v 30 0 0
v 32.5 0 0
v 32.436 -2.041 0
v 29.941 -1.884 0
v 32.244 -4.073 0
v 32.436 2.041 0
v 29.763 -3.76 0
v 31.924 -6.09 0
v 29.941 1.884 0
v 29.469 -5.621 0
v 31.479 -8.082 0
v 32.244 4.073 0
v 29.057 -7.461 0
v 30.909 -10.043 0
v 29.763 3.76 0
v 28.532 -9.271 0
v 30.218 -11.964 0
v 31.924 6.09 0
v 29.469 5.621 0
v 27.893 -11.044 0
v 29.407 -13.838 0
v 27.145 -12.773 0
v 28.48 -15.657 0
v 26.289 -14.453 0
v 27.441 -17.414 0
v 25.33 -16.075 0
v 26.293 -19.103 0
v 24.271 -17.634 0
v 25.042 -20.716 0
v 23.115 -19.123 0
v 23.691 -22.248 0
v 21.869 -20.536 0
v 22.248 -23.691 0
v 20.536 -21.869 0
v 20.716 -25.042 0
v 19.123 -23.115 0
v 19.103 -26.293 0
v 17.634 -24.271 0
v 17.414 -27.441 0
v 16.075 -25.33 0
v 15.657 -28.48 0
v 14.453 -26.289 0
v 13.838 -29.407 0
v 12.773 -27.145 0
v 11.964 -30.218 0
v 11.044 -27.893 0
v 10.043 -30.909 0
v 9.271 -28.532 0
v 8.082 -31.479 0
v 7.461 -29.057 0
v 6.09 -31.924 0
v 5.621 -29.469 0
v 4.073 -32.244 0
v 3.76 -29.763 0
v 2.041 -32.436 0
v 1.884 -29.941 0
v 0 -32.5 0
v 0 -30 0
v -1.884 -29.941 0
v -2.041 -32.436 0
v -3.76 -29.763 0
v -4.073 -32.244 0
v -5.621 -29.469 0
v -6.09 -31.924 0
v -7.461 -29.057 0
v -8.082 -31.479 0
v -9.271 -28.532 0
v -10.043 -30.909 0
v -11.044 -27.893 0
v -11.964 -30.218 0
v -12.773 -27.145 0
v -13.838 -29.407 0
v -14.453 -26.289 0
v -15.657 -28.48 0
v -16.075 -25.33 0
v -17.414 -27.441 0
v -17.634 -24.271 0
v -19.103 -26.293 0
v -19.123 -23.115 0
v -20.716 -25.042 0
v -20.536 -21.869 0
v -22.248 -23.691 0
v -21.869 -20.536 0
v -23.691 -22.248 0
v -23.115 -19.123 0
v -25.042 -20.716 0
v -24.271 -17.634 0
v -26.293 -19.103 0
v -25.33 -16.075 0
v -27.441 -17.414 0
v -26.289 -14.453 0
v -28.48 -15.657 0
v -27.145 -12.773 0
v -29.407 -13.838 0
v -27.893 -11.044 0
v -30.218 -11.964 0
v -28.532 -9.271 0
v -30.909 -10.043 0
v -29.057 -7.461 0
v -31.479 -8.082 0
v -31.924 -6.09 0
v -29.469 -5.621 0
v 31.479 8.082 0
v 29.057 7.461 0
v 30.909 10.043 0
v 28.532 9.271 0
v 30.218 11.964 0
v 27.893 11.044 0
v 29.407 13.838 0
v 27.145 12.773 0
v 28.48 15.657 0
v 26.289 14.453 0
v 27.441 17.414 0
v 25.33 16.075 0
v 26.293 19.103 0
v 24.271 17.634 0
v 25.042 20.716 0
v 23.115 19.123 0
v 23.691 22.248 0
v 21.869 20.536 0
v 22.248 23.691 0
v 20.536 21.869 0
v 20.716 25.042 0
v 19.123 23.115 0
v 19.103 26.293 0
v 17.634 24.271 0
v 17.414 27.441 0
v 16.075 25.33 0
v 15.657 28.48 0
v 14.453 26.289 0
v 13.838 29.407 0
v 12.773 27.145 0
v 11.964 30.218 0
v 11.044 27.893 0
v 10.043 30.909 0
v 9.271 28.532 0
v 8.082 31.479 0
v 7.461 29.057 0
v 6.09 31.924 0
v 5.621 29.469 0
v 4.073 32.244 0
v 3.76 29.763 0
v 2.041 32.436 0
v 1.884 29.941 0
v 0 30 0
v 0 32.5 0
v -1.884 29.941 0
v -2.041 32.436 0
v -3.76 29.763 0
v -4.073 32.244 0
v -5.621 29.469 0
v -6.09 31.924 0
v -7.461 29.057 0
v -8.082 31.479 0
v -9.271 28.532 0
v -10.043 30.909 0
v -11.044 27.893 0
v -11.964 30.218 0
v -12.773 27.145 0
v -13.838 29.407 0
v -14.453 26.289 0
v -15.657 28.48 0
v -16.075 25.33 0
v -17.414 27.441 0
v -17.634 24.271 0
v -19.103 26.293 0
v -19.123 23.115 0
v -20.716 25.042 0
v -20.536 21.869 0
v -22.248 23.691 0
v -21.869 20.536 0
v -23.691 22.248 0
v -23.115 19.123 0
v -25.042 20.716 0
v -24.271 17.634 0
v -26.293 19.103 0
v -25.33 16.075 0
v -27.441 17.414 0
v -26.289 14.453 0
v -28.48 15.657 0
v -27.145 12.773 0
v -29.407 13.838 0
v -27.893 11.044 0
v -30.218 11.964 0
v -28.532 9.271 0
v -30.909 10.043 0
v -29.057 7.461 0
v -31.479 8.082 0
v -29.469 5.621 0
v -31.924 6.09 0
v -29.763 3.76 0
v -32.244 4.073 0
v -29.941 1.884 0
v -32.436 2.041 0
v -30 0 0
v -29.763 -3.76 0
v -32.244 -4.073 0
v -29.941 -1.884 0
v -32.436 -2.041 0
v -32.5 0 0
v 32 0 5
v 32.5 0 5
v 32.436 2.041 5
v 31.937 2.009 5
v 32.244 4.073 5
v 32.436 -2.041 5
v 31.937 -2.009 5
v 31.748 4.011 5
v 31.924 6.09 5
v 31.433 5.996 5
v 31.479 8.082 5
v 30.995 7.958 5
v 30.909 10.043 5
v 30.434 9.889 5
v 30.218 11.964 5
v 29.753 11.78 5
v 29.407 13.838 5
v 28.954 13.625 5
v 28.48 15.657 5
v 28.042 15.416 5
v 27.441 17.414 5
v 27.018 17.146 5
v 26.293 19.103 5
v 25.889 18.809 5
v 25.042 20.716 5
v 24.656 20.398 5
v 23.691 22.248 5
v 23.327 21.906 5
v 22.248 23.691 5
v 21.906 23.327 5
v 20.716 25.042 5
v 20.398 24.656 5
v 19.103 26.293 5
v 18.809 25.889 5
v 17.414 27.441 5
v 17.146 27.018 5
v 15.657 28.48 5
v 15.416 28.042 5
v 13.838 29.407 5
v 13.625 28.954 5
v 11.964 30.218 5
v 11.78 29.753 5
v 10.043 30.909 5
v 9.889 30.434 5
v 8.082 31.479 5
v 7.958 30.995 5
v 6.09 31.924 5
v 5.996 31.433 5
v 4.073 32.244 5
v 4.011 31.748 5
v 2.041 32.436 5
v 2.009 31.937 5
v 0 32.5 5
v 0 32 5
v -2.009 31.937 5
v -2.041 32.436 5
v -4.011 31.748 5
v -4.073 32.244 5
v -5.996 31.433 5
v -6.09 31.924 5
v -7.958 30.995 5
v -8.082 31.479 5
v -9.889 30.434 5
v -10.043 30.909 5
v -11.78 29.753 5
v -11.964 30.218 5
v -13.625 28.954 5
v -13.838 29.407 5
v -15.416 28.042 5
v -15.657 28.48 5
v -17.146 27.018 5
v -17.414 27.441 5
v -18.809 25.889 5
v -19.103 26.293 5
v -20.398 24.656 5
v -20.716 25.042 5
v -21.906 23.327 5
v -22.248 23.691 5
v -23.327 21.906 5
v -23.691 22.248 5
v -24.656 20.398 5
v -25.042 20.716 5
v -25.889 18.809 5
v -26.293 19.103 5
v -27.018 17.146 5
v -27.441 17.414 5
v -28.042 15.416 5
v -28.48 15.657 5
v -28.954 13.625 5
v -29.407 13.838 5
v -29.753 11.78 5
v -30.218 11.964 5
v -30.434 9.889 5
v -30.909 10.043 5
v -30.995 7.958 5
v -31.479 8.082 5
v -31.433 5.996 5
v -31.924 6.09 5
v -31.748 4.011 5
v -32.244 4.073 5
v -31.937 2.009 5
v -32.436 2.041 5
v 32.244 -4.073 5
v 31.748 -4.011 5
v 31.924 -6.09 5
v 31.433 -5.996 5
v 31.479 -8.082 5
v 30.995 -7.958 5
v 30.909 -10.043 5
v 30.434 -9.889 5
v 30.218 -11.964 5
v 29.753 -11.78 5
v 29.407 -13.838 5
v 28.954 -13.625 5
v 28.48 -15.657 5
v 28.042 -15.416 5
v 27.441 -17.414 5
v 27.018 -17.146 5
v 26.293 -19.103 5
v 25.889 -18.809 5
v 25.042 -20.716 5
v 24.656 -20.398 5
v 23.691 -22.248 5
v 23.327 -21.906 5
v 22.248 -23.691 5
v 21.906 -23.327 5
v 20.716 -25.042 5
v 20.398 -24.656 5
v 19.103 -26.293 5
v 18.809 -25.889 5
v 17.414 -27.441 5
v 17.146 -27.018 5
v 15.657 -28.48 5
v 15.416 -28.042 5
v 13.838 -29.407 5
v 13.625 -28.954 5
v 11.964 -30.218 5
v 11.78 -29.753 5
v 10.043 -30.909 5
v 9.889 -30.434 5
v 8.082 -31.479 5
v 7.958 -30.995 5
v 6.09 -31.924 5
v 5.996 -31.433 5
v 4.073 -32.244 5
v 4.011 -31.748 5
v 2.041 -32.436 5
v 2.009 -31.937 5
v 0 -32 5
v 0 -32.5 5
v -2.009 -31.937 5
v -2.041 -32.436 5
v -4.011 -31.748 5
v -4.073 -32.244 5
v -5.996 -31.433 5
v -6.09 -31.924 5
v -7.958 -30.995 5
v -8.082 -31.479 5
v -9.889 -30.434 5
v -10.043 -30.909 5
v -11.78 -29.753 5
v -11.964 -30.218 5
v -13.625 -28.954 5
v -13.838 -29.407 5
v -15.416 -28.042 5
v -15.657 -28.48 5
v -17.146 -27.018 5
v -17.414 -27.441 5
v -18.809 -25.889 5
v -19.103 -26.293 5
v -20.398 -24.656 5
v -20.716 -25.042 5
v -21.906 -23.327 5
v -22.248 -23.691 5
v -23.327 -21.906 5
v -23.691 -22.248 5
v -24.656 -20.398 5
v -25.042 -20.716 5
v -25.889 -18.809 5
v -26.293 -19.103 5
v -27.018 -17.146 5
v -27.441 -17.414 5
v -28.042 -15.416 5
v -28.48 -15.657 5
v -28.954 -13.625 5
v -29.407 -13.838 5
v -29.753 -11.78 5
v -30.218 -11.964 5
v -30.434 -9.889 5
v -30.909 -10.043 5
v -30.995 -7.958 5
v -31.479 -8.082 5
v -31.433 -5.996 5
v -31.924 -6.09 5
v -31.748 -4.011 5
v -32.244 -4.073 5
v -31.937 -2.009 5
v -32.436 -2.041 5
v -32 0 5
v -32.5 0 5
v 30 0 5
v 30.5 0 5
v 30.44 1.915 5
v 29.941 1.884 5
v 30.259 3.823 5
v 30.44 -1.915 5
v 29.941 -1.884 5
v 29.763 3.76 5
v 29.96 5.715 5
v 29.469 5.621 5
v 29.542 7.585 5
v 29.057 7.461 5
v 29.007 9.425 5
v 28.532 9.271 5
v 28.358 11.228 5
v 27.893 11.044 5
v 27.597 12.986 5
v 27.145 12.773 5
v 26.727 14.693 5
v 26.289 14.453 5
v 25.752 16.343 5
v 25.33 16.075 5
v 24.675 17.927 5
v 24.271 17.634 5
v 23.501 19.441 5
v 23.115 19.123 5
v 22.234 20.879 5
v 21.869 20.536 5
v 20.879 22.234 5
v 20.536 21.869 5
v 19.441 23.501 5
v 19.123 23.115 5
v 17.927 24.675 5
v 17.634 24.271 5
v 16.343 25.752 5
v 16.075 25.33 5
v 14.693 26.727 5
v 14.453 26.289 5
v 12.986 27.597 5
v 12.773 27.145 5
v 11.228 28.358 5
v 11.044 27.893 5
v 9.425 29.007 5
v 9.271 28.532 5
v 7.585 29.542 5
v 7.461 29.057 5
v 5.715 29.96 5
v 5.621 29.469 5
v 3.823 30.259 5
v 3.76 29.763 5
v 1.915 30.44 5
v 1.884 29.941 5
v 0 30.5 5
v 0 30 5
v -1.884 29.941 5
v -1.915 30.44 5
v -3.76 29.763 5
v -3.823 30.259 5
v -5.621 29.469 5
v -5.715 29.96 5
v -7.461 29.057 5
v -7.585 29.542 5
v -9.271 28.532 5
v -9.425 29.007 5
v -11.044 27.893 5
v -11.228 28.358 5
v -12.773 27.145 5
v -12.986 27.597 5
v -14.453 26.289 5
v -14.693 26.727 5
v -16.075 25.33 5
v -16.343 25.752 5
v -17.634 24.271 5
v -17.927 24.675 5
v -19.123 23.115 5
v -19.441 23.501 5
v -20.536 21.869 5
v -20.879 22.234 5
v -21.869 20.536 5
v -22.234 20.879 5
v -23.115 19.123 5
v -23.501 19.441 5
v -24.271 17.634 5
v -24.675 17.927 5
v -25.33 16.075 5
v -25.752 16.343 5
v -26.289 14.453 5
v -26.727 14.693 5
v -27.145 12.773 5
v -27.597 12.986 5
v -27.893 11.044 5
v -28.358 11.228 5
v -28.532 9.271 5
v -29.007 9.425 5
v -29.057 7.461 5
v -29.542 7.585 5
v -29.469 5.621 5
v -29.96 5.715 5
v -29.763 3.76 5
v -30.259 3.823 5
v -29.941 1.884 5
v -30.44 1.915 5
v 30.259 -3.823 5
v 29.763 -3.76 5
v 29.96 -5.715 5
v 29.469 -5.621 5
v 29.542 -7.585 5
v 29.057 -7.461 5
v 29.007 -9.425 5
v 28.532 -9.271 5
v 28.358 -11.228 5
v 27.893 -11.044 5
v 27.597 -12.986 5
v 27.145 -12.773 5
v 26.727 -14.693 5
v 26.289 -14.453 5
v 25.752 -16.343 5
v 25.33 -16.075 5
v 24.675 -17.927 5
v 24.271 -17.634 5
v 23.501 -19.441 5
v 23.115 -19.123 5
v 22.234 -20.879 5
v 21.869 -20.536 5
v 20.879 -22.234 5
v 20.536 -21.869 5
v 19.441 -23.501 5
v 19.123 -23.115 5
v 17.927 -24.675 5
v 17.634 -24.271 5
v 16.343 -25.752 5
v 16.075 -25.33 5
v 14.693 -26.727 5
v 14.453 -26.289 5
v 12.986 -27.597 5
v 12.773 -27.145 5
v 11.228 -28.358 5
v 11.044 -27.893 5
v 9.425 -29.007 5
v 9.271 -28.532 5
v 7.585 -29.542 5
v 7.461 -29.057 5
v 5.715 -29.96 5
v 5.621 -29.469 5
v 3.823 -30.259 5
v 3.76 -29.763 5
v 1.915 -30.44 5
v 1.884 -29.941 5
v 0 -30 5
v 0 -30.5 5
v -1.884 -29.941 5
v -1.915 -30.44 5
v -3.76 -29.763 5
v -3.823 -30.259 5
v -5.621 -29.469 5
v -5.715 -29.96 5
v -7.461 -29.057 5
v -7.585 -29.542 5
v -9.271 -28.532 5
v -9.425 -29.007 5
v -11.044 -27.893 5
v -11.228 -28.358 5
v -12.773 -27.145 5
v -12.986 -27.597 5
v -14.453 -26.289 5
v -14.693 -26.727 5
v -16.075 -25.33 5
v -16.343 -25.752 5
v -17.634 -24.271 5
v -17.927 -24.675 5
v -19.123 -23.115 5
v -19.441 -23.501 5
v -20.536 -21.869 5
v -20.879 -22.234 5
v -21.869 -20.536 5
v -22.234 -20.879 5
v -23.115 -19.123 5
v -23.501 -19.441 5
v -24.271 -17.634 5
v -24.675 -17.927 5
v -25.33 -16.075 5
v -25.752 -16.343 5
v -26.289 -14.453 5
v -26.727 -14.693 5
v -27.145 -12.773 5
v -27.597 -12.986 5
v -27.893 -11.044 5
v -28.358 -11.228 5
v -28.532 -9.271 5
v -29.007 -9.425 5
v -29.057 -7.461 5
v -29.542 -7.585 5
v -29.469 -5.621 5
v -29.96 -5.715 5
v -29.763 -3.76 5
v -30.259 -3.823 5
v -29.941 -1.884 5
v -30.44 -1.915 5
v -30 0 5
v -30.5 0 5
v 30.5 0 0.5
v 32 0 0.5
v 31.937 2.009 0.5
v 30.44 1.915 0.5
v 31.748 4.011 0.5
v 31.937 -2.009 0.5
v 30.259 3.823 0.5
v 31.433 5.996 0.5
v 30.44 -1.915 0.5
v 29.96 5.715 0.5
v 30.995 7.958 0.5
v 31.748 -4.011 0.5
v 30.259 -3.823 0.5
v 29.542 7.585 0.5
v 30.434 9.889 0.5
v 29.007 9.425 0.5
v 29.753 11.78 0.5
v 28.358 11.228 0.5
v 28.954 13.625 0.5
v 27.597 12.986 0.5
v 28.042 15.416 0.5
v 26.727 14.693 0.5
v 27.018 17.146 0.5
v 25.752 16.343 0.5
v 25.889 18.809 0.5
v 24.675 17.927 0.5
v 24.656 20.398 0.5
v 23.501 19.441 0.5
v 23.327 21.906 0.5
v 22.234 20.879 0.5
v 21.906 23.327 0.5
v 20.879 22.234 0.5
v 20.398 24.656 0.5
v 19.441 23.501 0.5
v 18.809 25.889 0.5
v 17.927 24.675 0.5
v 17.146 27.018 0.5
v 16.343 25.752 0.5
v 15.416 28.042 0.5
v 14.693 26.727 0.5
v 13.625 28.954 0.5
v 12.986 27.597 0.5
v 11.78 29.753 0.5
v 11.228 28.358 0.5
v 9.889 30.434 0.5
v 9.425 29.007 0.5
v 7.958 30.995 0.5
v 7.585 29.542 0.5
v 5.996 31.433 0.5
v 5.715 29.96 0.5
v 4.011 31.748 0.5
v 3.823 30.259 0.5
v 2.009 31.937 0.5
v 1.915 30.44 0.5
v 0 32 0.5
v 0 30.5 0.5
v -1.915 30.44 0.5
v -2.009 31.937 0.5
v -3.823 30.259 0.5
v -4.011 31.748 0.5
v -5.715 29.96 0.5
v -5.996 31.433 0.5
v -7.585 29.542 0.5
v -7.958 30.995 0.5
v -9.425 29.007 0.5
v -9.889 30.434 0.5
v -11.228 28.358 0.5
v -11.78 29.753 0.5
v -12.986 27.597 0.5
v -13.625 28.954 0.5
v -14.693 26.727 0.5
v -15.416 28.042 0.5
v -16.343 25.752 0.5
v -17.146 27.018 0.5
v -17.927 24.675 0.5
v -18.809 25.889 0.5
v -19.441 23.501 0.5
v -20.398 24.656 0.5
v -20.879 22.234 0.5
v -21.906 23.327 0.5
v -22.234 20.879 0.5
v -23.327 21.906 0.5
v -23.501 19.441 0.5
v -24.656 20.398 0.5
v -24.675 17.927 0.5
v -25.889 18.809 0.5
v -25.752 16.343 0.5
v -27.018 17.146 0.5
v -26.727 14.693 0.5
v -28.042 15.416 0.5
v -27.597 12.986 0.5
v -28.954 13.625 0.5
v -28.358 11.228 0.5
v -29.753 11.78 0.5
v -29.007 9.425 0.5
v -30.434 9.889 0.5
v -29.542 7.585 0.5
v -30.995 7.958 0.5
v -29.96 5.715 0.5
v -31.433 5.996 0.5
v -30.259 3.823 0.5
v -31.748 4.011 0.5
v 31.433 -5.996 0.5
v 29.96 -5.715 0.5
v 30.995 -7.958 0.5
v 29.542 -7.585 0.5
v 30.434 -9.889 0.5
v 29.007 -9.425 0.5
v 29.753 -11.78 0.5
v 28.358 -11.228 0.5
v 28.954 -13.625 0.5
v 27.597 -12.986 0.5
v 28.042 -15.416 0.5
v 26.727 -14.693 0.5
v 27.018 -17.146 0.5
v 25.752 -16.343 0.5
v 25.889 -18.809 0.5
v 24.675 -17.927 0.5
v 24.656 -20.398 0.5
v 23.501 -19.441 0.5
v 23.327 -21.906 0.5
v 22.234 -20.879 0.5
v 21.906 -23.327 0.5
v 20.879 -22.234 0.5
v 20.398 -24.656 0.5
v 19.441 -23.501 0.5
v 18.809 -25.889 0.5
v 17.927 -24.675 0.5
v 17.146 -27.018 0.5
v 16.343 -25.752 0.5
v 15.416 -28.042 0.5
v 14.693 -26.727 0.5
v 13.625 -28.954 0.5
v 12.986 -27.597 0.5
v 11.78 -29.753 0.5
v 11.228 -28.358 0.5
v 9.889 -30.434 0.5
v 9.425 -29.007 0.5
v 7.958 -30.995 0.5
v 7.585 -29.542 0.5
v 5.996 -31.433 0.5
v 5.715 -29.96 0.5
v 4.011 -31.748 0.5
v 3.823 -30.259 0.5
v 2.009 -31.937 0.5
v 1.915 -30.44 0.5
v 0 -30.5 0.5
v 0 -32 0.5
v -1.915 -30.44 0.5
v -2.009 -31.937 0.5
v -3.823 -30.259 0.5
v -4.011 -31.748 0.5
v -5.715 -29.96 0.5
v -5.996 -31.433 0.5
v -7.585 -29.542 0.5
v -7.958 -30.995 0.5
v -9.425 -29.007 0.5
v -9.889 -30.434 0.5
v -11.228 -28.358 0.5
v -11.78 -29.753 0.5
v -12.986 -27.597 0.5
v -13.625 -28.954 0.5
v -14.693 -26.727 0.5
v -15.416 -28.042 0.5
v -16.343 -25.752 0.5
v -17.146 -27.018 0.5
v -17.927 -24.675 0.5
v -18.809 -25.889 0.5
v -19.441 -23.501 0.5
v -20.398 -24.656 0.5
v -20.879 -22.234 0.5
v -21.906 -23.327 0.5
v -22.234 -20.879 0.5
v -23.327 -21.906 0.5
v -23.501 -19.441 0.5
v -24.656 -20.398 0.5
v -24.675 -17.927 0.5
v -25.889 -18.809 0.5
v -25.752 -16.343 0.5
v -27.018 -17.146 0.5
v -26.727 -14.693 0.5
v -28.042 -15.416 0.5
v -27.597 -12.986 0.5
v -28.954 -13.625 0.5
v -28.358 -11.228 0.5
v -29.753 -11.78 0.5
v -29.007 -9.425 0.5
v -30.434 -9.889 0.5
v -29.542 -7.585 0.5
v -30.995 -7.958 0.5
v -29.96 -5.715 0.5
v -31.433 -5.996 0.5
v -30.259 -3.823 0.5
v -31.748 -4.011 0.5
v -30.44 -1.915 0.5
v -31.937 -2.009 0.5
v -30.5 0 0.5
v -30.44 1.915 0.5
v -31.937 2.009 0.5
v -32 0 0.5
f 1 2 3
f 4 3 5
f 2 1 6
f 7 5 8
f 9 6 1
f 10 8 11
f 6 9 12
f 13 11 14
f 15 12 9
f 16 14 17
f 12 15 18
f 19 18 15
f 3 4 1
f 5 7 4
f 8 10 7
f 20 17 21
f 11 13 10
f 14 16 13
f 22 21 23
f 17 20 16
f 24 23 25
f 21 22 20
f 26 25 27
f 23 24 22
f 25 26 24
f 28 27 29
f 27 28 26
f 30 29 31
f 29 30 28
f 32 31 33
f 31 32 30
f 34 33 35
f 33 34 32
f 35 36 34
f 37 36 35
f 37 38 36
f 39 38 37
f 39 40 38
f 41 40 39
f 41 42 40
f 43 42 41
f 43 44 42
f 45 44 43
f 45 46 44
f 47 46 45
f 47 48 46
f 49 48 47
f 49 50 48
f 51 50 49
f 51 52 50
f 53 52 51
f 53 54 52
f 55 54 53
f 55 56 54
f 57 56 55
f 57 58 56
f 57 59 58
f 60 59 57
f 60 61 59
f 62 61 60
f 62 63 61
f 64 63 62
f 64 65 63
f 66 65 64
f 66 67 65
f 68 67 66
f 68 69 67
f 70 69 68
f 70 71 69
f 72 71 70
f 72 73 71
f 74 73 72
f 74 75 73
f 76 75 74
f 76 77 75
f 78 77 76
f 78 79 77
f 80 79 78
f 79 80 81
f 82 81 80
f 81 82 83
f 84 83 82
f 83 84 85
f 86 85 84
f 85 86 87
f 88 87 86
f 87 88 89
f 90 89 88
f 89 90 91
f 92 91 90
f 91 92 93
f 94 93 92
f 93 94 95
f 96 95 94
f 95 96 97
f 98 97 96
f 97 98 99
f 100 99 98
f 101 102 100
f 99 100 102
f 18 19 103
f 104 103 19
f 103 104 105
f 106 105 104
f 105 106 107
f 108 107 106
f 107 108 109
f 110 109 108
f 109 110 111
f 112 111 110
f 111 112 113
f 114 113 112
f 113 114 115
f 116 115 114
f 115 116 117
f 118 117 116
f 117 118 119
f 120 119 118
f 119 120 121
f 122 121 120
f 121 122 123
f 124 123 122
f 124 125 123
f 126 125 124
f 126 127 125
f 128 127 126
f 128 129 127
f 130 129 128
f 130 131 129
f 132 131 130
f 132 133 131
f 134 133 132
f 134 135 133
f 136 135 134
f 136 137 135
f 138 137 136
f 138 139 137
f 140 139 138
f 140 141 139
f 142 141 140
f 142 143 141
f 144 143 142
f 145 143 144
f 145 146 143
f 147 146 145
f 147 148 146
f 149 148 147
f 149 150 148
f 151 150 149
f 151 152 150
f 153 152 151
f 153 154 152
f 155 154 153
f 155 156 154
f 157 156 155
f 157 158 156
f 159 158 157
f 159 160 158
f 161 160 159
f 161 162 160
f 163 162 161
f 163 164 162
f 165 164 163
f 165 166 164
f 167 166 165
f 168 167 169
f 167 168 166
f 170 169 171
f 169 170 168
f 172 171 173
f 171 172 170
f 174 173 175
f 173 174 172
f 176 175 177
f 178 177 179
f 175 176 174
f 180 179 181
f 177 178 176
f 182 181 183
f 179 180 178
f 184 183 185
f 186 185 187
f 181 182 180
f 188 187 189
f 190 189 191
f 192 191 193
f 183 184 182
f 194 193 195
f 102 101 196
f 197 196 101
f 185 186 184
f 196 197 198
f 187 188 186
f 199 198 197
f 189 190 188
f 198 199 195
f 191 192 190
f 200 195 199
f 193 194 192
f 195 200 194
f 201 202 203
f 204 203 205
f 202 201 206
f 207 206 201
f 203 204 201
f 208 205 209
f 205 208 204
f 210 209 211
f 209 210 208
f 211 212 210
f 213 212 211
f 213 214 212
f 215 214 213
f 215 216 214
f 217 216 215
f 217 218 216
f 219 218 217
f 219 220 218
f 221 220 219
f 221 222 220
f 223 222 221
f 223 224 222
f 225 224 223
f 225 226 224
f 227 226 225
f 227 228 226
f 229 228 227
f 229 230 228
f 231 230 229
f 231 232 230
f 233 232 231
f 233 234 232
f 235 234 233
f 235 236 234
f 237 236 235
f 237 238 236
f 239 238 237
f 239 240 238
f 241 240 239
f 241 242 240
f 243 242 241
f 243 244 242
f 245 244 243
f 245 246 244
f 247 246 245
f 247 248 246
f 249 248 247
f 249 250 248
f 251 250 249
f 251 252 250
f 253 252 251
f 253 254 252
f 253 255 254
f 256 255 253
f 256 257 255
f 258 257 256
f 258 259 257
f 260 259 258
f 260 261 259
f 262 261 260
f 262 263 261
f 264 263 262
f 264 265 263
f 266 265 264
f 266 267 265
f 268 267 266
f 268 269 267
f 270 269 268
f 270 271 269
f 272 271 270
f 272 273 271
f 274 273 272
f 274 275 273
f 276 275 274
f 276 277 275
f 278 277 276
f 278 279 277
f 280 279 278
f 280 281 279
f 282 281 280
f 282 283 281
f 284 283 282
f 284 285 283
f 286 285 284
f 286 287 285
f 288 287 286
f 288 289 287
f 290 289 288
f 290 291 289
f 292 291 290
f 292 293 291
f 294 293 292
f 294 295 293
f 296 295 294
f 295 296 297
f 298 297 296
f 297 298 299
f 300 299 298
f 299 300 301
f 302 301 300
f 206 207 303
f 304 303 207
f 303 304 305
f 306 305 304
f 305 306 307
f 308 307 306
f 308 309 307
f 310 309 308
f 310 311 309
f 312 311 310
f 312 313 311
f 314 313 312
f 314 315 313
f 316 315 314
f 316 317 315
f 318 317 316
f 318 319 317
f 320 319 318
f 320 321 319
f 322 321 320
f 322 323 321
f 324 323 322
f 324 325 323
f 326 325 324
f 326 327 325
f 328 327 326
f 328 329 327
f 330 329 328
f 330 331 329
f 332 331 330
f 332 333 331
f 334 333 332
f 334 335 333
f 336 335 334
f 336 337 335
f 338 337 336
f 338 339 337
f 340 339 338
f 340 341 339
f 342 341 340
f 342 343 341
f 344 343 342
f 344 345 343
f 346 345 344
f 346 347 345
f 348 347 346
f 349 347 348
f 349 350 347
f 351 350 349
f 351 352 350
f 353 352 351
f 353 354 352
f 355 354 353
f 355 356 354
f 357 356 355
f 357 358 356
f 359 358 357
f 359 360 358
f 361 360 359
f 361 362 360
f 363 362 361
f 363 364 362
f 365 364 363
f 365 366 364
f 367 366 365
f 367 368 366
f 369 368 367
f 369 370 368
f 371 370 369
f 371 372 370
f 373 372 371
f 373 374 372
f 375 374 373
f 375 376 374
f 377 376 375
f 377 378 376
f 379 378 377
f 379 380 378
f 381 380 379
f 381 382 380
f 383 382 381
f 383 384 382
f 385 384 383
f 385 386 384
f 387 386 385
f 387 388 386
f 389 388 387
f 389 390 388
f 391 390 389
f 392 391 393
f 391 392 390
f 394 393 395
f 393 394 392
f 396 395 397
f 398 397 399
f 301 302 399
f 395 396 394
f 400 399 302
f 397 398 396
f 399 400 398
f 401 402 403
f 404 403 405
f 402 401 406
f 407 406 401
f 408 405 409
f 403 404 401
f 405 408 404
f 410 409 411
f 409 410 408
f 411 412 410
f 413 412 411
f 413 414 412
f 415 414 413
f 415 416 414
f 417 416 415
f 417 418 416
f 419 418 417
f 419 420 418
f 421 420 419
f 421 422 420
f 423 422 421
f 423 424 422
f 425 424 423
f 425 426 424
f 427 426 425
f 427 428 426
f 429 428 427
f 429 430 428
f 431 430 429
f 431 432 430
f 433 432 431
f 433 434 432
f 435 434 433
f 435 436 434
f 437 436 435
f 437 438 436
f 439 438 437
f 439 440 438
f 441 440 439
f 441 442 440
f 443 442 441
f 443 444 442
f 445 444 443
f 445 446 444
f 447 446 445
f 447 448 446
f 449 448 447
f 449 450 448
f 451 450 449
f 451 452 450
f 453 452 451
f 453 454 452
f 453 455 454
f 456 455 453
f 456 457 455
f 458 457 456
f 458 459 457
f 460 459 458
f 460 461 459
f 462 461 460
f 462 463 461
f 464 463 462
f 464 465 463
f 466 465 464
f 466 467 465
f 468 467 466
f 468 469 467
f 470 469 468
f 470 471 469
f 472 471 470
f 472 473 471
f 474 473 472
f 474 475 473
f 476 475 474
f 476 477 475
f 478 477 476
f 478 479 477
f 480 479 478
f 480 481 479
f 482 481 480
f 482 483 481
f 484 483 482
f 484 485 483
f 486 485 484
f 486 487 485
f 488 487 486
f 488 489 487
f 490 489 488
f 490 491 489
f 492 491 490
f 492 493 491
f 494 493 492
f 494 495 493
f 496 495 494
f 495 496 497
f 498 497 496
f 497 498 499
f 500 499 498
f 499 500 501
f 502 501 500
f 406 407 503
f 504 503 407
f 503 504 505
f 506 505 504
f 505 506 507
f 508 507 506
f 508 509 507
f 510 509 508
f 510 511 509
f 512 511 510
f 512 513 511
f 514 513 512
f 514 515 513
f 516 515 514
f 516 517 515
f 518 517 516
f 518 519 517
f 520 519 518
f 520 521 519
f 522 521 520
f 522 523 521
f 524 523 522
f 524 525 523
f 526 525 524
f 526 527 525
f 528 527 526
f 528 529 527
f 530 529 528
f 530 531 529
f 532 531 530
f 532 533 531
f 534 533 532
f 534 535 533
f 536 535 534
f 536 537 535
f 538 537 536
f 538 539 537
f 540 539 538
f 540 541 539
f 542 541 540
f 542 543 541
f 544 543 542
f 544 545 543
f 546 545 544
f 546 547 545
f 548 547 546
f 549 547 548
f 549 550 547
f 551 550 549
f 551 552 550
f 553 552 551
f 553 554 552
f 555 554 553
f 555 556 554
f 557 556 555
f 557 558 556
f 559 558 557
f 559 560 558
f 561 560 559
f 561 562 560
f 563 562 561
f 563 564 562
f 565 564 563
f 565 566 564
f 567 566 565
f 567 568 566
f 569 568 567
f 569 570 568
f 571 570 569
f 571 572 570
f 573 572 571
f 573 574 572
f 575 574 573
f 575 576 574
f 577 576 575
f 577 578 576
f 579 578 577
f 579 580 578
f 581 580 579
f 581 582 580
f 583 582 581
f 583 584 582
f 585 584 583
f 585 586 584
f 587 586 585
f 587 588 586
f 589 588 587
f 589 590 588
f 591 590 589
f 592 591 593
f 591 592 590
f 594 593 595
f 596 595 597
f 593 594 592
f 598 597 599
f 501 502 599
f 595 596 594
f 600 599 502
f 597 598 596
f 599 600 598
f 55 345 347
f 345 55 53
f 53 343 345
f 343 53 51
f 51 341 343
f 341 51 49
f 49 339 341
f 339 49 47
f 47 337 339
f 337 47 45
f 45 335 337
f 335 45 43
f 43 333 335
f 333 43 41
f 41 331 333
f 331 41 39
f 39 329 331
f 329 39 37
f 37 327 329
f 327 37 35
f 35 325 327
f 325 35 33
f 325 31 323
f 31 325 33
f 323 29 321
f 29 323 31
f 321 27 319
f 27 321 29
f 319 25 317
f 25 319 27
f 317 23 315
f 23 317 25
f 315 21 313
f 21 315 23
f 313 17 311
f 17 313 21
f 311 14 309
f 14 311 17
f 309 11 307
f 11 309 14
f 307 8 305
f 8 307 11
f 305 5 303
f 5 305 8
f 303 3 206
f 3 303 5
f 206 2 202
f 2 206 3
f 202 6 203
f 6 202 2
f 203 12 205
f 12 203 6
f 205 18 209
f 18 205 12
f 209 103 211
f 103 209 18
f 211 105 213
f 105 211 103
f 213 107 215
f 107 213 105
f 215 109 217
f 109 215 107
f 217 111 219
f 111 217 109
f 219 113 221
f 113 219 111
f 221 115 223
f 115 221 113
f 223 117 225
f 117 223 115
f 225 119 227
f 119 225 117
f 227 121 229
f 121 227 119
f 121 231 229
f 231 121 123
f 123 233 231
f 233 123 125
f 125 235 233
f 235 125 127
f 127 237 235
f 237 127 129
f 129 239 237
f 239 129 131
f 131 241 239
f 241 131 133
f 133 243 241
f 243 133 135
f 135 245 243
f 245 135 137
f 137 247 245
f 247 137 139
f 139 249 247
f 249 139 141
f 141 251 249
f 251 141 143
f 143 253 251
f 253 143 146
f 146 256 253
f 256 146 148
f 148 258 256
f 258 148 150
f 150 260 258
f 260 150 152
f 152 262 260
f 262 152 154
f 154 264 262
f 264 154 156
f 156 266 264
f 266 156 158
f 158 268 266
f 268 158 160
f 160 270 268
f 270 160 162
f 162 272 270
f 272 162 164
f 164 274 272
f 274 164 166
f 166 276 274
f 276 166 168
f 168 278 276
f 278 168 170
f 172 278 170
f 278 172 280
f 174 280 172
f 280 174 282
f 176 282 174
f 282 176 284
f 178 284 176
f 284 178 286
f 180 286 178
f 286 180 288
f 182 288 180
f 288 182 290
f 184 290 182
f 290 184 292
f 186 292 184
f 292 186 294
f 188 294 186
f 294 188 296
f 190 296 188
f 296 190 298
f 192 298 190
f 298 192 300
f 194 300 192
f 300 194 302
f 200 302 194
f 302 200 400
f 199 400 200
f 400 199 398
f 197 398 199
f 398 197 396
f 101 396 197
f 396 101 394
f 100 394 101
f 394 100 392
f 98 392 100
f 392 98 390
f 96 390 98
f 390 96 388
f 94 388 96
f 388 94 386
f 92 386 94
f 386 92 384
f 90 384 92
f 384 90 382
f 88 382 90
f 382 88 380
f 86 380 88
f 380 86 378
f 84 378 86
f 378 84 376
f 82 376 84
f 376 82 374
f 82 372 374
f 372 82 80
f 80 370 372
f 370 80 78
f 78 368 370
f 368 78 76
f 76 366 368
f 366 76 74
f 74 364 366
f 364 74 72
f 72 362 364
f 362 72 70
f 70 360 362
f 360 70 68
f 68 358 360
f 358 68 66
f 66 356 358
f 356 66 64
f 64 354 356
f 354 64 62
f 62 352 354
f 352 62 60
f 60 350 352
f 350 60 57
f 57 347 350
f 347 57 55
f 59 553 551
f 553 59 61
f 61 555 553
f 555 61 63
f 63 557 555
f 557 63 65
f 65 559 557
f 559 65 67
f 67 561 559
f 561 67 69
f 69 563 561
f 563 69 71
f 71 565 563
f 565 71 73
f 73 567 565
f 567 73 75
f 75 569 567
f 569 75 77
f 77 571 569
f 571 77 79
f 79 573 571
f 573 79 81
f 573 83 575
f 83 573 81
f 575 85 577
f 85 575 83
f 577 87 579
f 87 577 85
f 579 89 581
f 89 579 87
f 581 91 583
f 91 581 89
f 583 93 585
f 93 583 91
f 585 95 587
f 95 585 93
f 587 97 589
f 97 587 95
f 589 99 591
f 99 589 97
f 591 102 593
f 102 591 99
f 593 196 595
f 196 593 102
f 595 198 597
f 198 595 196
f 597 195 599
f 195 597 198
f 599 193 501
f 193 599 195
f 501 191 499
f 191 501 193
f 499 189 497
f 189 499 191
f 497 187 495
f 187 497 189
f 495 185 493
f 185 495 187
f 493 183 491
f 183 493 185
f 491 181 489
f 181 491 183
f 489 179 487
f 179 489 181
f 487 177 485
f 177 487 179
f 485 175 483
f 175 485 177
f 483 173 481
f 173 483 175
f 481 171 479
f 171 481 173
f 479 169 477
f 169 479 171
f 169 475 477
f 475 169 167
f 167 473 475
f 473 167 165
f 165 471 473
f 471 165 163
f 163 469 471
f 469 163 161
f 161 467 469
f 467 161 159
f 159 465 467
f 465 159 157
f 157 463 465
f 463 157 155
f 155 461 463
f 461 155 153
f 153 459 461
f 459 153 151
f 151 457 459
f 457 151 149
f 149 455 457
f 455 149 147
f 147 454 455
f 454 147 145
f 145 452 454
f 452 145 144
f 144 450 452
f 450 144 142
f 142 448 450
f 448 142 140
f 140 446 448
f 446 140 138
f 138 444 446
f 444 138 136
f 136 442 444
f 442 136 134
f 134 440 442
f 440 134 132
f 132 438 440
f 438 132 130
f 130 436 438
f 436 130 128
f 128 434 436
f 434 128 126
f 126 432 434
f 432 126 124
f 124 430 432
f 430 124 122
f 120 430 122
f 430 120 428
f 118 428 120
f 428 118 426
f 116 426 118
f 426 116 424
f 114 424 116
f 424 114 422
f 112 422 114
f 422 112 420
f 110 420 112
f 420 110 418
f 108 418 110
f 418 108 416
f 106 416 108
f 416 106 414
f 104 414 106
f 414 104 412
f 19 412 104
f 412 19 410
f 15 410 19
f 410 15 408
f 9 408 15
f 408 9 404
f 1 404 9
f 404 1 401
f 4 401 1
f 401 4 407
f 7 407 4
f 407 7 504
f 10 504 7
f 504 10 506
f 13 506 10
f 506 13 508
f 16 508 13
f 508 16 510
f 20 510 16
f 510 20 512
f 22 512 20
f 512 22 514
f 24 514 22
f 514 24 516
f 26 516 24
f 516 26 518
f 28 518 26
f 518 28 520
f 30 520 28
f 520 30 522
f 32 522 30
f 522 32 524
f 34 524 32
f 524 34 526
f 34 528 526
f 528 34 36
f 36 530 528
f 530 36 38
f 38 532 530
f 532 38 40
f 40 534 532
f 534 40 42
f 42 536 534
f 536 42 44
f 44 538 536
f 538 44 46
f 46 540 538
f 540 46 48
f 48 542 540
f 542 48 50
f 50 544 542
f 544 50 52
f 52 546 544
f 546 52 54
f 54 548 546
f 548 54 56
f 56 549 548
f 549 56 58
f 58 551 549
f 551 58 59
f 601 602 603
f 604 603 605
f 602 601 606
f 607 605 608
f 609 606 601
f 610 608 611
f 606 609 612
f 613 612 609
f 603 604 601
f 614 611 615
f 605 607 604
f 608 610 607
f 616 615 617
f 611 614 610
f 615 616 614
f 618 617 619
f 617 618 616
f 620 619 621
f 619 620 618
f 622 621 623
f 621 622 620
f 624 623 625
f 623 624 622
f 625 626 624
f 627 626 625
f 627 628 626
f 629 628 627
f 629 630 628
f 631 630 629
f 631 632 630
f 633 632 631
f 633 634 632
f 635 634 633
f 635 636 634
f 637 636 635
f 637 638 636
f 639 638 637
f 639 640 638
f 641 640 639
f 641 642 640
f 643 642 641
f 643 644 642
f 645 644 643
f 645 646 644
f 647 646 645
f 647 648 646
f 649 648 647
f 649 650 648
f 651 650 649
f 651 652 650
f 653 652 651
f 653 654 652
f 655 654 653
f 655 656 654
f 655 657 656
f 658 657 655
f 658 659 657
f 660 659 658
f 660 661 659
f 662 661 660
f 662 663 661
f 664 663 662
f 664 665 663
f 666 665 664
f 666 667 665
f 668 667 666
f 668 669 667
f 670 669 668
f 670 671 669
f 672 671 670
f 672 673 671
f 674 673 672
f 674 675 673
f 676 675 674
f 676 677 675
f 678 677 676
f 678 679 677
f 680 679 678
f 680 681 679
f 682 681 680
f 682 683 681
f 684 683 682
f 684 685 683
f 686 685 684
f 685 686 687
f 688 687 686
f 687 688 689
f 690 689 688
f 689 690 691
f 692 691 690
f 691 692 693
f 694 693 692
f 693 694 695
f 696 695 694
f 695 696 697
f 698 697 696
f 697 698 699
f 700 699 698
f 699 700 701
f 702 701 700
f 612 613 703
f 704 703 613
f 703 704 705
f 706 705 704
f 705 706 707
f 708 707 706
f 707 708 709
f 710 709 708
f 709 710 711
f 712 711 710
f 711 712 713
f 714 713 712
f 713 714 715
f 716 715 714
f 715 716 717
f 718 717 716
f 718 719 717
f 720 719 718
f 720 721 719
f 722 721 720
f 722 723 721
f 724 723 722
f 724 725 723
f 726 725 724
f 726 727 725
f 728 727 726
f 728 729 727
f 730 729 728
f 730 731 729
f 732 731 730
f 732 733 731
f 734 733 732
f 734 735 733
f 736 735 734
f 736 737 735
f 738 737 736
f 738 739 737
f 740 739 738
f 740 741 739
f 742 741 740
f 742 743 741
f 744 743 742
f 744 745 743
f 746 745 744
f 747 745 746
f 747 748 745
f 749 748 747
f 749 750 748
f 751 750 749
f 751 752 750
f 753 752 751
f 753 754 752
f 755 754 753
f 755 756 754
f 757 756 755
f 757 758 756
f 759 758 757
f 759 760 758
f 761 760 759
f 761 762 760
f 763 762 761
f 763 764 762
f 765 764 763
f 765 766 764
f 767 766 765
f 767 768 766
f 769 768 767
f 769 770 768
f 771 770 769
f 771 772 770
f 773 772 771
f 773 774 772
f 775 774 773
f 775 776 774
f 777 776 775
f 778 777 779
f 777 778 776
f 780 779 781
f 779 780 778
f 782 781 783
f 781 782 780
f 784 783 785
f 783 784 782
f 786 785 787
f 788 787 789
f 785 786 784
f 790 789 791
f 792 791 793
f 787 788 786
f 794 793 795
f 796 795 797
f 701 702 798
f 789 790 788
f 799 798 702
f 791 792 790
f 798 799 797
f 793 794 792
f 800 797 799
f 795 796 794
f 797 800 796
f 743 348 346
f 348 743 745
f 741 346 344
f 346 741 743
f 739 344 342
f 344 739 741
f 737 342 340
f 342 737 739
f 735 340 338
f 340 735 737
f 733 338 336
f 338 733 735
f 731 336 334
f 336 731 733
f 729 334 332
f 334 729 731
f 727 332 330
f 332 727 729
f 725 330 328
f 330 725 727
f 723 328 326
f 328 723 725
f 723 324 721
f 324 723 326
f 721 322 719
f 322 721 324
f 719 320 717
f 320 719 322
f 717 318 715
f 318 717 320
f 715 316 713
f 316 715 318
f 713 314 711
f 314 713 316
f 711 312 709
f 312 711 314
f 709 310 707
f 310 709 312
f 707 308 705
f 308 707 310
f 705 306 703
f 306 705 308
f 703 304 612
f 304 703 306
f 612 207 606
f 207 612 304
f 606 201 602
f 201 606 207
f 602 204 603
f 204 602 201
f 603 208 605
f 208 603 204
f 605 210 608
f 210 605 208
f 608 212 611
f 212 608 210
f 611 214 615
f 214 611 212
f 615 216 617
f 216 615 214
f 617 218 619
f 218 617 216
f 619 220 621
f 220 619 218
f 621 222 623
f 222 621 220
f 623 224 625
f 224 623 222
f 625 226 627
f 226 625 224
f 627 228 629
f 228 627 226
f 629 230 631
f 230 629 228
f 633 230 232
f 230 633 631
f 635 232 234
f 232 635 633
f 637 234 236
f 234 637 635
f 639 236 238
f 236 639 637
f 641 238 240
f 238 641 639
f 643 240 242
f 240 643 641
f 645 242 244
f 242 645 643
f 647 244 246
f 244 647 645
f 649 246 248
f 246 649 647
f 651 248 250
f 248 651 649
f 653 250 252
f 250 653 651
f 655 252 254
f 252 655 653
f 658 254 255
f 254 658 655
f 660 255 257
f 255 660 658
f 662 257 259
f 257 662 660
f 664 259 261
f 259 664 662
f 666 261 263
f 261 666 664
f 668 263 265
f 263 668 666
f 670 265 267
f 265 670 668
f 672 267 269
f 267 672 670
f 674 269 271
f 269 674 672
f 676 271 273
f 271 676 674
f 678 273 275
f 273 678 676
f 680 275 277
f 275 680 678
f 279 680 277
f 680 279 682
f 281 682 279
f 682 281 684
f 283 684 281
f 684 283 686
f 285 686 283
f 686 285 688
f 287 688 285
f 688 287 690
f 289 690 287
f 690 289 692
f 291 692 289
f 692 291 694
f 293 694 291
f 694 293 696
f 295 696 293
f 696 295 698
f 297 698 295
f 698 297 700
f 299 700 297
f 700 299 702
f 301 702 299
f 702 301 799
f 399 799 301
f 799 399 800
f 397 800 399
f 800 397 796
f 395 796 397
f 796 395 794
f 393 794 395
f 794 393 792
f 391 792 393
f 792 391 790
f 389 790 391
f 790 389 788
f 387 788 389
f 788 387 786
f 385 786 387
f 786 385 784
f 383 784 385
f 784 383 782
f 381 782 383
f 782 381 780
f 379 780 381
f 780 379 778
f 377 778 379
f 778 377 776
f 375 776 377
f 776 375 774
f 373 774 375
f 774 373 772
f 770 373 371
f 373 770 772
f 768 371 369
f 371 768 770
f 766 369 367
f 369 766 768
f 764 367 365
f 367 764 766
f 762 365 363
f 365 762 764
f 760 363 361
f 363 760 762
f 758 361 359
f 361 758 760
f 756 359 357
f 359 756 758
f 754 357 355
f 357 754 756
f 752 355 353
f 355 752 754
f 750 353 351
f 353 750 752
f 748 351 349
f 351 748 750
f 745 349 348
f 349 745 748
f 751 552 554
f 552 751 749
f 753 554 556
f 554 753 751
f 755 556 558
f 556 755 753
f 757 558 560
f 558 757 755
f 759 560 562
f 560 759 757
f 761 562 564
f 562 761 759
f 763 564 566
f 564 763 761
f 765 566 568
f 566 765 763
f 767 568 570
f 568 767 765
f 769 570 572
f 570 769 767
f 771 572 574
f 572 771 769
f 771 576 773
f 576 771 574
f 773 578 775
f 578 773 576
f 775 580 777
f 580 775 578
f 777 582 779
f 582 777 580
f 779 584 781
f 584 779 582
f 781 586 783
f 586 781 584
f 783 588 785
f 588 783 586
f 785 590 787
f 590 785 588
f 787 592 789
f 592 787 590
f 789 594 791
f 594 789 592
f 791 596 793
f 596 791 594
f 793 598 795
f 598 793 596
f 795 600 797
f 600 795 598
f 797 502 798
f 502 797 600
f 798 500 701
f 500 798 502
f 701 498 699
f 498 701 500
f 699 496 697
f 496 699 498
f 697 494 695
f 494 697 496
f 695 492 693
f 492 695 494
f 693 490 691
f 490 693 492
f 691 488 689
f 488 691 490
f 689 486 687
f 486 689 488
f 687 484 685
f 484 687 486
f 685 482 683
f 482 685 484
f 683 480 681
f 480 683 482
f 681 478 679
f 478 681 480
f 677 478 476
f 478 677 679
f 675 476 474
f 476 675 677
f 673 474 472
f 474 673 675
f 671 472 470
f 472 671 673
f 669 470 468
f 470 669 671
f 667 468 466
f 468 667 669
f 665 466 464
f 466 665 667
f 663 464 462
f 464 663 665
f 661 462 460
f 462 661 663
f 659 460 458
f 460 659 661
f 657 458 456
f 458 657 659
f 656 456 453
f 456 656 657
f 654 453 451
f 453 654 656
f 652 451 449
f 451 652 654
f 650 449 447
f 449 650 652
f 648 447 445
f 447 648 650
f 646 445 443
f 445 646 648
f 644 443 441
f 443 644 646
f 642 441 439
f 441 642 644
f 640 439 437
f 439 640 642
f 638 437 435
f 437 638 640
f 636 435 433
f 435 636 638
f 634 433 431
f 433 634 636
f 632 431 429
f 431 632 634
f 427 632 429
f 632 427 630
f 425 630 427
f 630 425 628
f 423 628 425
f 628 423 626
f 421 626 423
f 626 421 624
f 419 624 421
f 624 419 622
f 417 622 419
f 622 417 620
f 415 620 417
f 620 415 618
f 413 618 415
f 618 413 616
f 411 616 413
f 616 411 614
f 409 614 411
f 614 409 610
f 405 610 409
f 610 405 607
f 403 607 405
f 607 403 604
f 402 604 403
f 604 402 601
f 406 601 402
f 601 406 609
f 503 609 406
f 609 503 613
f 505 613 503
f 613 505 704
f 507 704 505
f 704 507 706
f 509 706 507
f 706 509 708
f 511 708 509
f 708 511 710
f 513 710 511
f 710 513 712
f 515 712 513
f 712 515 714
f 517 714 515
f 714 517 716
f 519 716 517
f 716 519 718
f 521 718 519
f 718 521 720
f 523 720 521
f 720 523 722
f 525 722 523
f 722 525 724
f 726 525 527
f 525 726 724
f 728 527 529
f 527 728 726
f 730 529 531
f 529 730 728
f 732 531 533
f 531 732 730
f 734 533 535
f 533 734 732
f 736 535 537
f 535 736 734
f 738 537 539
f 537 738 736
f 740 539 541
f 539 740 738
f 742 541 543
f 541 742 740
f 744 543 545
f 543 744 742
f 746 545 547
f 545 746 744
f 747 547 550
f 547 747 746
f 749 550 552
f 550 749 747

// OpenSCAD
$fn = 100;

wall_thick = 0.5;

r_out_out = (64/2) + wall_thick;
r_out_in = r_out_out - wall_thick;

r_in_out = (61/2) - wall_thick;
r_in_in = r_in_out + wall_thick;

height = 5;

difference() {
    linear_extrude(height)
    {
        difference() {
            circle(r_out_out, center=true);
            circle(r_in_out, center=true);
        };
    };
    translate([0, 0, wall_thick])
    linear_extrude(height)
    {
        difference() {
            circle(r_out_in, center=true);
            circle(r_in_in, center=true);
        };
    };
}
